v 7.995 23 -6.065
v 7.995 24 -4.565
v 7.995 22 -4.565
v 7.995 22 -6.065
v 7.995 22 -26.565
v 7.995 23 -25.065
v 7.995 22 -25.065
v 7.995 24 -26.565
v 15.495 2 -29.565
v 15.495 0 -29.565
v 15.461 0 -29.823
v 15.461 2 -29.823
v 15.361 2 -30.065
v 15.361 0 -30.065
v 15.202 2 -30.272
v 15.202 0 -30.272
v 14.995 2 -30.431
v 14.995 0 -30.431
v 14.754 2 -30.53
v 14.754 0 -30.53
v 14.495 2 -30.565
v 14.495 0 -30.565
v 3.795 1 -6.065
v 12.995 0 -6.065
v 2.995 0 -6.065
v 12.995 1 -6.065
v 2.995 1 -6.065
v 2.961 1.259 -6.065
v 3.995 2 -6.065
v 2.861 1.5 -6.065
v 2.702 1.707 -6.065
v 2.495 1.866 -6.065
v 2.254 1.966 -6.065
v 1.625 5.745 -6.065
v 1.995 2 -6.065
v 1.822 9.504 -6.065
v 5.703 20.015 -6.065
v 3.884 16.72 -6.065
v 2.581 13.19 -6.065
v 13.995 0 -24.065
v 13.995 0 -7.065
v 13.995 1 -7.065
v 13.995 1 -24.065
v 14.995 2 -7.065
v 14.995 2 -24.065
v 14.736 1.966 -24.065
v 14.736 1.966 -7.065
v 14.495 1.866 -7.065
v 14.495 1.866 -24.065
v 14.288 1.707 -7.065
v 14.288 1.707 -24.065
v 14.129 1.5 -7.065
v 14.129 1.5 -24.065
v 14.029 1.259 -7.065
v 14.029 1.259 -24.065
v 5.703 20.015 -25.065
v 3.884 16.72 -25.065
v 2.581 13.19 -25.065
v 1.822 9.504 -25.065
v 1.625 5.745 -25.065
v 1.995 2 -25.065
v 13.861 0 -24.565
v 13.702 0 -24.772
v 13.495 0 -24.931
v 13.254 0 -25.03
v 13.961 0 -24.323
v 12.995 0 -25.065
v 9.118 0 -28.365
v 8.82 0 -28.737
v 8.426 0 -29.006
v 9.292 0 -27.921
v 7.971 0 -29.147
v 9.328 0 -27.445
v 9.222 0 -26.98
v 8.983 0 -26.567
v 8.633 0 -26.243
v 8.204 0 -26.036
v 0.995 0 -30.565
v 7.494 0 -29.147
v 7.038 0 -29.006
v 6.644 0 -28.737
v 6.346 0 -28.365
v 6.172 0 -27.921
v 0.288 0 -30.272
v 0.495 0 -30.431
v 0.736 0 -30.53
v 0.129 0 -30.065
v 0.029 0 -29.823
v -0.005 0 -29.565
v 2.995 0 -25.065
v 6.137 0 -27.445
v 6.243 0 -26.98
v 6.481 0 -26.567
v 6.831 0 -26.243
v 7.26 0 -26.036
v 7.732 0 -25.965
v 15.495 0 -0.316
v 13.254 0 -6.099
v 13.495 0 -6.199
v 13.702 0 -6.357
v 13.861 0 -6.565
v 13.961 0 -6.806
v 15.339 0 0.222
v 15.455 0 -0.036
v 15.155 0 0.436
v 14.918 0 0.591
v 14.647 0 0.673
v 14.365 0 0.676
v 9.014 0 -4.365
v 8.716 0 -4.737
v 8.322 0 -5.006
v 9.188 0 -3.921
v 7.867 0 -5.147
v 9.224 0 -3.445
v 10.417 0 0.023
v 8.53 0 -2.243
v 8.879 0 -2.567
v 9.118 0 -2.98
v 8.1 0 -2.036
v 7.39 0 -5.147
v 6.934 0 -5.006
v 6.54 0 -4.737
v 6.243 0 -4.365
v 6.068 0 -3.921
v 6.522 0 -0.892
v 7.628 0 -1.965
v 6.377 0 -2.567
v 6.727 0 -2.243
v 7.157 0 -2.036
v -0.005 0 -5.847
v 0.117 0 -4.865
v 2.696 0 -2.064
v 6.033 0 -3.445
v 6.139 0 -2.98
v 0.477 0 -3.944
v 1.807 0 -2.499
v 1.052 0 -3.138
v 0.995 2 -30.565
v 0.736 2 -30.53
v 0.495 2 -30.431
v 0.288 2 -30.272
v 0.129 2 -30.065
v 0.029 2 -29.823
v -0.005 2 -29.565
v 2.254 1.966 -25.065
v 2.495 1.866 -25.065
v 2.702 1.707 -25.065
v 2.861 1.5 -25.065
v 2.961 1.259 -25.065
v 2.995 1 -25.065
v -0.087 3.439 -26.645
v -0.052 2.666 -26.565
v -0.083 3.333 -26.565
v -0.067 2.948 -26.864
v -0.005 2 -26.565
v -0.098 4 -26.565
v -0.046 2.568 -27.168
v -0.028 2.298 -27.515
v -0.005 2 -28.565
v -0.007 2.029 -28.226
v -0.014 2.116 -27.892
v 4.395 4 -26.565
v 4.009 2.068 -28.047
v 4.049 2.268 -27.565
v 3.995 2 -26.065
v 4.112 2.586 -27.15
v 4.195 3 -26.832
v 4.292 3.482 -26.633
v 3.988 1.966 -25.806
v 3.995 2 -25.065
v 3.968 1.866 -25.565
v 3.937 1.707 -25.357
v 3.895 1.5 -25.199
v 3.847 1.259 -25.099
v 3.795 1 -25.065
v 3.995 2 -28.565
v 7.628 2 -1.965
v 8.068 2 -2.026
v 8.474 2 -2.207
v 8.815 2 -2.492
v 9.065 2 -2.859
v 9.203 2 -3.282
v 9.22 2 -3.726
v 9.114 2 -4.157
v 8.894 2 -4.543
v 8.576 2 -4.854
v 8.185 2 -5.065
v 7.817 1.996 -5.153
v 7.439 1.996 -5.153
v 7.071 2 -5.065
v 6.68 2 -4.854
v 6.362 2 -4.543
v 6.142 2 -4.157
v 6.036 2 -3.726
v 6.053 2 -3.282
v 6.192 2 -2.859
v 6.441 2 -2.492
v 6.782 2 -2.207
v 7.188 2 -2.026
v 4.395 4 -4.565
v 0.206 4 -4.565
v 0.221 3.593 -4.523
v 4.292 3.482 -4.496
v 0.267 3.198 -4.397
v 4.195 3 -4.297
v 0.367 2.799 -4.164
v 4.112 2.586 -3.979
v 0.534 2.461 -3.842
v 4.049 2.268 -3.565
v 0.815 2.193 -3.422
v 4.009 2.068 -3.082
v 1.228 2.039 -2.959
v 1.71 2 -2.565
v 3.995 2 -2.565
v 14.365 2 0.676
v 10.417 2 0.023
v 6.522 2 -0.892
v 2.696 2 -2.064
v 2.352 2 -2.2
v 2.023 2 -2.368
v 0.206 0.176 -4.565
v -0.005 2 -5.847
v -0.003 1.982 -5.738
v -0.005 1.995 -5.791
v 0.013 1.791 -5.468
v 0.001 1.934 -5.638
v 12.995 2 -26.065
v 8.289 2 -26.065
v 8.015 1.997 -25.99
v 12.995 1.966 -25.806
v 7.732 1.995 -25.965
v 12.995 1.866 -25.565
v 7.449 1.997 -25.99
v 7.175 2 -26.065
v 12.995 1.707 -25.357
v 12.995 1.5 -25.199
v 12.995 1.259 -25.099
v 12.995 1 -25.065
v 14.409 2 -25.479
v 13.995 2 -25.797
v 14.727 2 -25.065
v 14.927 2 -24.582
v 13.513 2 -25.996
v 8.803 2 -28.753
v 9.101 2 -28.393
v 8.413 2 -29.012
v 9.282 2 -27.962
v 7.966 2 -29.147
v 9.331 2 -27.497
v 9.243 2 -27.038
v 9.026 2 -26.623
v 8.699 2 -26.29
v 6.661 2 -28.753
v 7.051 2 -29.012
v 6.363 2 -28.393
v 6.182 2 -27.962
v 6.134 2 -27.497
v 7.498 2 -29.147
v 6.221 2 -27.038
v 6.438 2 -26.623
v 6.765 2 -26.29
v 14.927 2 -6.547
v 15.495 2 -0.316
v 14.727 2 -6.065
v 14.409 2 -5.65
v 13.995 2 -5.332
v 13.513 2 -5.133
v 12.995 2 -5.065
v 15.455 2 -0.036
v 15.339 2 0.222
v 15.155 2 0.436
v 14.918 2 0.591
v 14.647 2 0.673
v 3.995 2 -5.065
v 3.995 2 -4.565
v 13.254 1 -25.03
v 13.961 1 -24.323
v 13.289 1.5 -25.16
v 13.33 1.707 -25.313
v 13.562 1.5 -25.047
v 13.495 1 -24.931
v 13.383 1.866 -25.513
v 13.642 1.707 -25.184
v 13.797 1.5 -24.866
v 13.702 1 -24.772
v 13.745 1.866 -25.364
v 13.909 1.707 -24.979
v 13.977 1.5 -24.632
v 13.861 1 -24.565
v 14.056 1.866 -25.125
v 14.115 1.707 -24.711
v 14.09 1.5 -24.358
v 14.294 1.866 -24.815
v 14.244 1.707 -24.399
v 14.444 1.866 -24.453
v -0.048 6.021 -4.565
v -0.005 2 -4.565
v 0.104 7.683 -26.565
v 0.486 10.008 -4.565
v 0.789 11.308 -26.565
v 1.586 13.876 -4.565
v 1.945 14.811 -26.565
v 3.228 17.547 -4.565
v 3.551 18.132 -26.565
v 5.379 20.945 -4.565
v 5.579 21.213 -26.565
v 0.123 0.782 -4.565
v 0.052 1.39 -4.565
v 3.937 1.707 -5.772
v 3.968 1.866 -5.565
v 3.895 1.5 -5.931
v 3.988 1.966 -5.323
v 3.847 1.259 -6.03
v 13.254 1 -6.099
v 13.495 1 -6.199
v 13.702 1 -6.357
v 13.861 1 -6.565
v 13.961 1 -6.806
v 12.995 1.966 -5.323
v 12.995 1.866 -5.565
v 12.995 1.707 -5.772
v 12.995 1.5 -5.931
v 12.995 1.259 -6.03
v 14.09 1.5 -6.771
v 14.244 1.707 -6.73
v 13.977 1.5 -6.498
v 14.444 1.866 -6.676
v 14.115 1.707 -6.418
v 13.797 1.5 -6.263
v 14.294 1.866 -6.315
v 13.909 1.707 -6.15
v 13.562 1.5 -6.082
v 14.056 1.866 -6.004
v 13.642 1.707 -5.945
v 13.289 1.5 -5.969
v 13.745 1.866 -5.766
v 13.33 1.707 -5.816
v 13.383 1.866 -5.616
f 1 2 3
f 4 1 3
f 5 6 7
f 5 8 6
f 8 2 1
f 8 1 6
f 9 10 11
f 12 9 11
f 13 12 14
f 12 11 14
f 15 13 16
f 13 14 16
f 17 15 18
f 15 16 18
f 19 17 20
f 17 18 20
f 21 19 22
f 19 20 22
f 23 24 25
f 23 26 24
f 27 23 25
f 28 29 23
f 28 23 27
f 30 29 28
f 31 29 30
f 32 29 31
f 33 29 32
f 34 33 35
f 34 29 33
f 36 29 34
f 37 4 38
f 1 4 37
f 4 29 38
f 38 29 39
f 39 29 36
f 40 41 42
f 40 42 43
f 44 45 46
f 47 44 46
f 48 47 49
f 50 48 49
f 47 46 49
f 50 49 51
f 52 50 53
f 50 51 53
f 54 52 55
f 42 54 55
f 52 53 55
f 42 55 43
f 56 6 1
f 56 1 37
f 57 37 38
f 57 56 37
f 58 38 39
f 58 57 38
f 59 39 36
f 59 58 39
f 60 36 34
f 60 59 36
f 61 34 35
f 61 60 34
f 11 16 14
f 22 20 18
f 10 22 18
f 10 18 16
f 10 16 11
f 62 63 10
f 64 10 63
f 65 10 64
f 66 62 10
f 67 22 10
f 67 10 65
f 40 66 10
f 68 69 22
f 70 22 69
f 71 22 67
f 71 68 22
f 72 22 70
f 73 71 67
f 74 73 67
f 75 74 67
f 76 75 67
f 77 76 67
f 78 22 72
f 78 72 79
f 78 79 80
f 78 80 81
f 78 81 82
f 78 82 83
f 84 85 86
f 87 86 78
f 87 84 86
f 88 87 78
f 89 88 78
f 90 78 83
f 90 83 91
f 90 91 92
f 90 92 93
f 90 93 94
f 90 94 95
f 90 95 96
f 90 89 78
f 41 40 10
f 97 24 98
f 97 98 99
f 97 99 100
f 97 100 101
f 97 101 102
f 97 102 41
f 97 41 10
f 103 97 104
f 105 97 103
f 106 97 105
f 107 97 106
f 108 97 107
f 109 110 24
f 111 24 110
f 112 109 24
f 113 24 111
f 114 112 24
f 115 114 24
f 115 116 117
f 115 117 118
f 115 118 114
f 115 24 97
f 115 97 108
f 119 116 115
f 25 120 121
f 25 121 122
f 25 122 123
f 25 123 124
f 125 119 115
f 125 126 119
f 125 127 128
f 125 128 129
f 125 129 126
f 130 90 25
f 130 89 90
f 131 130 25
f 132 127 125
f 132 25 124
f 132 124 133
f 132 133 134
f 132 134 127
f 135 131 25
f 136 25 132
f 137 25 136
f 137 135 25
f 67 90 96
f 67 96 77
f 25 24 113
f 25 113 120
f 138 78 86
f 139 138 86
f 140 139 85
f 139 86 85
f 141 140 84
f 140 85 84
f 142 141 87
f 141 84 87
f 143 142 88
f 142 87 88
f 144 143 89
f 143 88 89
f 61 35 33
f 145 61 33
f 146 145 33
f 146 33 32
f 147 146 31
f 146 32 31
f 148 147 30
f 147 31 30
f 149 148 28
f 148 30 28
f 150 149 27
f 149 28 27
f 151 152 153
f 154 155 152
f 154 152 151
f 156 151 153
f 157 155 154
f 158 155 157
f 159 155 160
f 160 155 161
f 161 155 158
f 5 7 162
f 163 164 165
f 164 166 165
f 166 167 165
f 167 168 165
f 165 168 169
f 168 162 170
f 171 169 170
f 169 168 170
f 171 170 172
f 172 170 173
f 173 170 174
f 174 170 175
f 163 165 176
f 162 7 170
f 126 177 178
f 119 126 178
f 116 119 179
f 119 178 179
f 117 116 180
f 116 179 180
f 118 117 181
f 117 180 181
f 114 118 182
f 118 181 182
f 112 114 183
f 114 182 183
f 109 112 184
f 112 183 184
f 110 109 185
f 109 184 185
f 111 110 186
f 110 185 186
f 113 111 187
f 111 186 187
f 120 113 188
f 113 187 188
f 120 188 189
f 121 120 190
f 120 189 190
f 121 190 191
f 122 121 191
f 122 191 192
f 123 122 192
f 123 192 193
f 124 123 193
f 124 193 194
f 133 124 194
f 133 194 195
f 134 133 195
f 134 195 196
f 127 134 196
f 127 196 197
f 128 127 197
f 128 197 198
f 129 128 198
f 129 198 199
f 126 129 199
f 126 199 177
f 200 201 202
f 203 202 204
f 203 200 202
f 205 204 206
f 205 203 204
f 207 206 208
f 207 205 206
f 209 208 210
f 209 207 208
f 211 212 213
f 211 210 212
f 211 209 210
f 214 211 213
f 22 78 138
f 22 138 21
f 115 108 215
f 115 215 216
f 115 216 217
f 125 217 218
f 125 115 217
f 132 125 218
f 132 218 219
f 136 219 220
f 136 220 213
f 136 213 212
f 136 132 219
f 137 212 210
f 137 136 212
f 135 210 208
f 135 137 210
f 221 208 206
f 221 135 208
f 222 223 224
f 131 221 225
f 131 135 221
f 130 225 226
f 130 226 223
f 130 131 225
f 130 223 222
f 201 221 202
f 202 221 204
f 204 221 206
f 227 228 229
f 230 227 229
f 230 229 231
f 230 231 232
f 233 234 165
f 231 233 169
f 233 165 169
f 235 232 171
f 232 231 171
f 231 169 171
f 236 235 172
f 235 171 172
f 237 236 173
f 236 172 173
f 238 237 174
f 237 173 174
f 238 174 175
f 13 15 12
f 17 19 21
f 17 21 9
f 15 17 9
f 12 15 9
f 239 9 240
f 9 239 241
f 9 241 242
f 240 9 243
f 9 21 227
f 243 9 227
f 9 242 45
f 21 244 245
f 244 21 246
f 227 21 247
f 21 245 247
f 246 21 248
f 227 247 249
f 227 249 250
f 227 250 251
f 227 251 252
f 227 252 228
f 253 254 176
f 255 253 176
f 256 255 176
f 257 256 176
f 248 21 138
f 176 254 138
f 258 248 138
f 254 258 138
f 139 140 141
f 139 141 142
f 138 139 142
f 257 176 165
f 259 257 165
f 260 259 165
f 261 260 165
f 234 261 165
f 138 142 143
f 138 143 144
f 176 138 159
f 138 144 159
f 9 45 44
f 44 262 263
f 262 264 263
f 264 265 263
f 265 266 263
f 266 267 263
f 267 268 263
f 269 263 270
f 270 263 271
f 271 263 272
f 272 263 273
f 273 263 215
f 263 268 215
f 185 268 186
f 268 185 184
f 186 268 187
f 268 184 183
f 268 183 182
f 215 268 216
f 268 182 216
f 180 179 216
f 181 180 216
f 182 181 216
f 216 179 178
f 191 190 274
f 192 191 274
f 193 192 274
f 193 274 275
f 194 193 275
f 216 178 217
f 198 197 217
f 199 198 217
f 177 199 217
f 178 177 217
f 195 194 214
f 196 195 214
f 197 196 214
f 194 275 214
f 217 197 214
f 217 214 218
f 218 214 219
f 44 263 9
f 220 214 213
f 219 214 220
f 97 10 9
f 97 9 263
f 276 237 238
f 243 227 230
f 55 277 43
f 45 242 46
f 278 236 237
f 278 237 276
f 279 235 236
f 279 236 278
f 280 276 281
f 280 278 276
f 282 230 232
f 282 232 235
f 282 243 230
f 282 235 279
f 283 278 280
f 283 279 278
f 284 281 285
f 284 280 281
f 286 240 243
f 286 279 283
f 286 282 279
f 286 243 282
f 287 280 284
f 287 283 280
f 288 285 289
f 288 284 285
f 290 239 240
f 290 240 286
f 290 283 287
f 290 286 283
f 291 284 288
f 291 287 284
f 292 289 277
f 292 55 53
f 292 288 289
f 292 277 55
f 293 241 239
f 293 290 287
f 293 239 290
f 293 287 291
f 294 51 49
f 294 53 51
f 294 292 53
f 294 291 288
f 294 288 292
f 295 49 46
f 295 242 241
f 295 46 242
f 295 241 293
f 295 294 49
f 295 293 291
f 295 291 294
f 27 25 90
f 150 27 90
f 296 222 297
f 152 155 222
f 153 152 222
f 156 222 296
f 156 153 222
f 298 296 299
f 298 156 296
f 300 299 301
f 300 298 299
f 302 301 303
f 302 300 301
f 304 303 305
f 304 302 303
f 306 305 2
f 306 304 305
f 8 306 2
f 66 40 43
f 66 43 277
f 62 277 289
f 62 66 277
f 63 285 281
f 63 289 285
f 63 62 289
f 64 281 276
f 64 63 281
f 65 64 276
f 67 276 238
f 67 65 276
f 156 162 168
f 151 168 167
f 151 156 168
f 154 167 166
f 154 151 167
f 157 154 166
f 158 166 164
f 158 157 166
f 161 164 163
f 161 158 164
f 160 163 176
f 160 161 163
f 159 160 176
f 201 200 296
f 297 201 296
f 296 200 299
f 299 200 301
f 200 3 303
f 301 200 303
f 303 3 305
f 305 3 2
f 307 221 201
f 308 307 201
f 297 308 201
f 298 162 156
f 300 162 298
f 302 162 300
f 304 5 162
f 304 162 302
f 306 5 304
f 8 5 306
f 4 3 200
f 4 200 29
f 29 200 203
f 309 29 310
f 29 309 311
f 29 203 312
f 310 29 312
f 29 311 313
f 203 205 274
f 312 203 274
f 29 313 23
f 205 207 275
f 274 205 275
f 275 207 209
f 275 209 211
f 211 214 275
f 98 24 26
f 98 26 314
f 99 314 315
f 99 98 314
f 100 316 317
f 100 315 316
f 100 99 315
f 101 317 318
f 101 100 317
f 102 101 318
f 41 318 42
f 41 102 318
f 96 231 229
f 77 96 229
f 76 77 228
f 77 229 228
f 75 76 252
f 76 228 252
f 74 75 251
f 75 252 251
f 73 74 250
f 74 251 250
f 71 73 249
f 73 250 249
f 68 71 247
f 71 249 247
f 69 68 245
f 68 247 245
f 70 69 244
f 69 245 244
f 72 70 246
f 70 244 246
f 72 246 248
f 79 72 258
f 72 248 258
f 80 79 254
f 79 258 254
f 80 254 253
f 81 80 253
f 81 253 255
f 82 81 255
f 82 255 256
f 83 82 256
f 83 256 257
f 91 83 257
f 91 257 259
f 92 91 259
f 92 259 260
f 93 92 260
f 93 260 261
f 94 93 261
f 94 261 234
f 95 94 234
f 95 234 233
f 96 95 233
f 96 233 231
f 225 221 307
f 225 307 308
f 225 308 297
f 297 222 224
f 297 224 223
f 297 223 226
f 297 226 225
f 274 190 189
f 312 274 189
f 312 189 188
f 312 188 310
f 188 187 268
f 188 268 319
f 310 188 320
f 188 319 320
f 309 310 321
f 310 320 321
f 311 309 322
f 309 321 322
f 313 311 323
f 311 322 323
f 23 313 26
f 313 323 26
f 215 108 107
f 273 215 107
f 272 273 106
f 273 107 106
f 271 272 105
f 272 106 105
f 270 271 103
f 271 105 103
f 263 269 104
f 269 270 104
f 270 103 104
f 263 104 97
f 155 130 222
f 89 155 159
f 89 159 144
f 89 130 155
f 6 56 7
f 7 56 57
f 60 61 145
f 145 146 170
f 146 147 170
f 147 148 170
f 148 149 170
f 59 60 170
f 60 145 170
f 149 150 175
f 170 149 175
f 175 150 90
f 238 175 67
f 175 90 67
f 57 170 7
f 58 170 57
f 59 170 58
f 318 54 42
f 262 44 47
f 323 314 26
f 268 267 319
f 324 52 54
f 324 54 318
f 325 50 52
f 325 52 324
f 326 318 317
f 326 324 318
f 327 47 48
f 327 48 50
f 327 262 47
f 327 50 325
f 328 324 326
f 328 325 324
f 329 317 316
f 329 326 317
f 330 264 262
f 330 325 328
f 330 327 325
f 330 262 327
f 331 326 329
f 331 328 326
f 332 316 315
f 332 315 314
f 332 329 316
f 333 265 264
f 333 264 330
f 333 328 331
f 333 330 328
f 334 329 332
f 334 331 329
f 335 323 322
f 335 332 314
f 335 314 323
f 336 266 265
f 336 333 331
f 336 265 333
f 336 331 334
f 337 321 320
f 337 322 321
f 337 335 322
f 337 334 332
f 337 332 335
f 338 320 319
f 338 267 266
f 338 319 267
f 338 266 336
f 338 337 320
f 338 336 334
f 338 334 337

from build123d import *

# Parameters (mm, degrees)
SKETCH1_W                = 11
SKETCH1_H                = 19
BOSS_EXTRUDE1_DEPTH      = 2
BOSS_EXTRUDE2_DEPTH      = 11
BOSS_EXTRUDE2_DEPTH_BACK = 11
BOSS_EXTRUDE3_DEPTH      = 1.5
BOSS_EXTRUDE4_START      = -22
BOSS_EXTRUDE4_DEPTH      = 1.5
SKETCH4_R                = 1.6
CUT_EXTRUDE1_DEPTH       = 41.722097522
FILLET1_R                = 4
FILLET2_R                = 1
FILLET3_R                = 2


with BuildPart() as part:
    # Sketch1 → Boss-Extrude1 (new body)
    with BuildSketch(Plane(origin=(0, 0, 0), x_dir=(1, 0, 0), z_dir=(0, 1, 0))):
        with BuildLine():
            Line((-0.004910497, 3.064545275), (-0.004910497, 30.564545275))
            Line((-0.004910497, 30.564545275), (15.495089503, 30.564545275))
            Line((15.495089503, 30.564545275), (15.495089503, -0.81352161))
            ThreePointArc((15.495089503, -0.81352161), (7.615422876, 0.607255499), (-0.004910497, 3.064545275))
        make_face()
        with Locations((8.495089503, 15.564545275)):
            Rectangle(SKETCH1_W, SKETCH1_H, mode=Mode.SUBTRACT)
    extrude(amount=BOSS_EXTRUDE1_DEPTH)

    # Sketch2 → Boss-Extrude2 (add, two sides: drawn at the far end of the back side and taken through both)
    with BuildSketch(Plane.XY.offset(-15.564545275).offset(-BOSS_EXTRUDE2_DEPTH_BACK)):
        with BuildLine():
            Line((7.995089503, 24), (7.995089503, 23))
            ThreePointArc((7.995089503, 23), (2.580593395, 13.189856031), (1.995089503, 2))
            Line((1.995089503, 2), (-0.004910497, 2))
            ThreePointArc((-0.004910497, 2), (1.585642128, 13.876162682), (7.995089503, 24))
        make_face()
    extrude(amount=BOSS_EXTRUDE2_DEPTH + BOSS_EXTRUDE2_DEPTH_BACK)

    # Sketch3 → Boss-Extrude3 (add)
    with BuildSketch(Plane.XY.offset(-4.564545275)):
        with BuildLine():
            Line((7.995089503, 24), (7.995089503, 22))
            Line((7.995089503, 22), (3.995089503, 2))
            Line((3.995089503, 2), (-0.004910497, 2))
            ThreePointArc((-0.004910497, 2), (1.760688004, 13.812509636), (7.995089503, 24))
        make_face()
    extrude(amount=-BOSS_EXTRUDE3_DEPTH)

    # Sketch3<2> → Boss-Extrude4 (add)
    with BuildSketch(Plane.XY.offset(-4.564545275).offset(BOSS_EXTRUDE4_START)):
        with BuildLine():
            Line((7.995089503, 24), (7.995089503, 22))
            Line((7.995089503, 22), (3.995089503, 2))
            Line((3.995089503, 2), (-0.004910497, 2))
            ThreePointArc((-0.004910497, 2), (1.760688004, 13.812509636), (7.995089503, 24))
        make_face()
    extrude(amount=BOSS_EXTRUDE4_DEPTH)

    # Sketch4 → Cut-Extrude1 (cut, through all)
    with BuildSketch(Plane(origin=(0, 2, 0), x_dir=(1, 0, 0), z_dir=(0, 1, 0))):
        with Locations(Location((7.732104354, 27.564545275, 0), (0, 0, 270))):
            Circle(SKETCH4_R)
        with Locations(Location((7.628223159, 3.564545275, 0), (0, 0, 270))):
            Circle(SKETCH4_R)
    extrude(amount=-CUT_EXTRUDE1_DEPTH, mode=Mode.SUBTRACT)

    # Fillet1
    # the kernel refuses this fillet: 4 mm, written as the material it takes off along each edge
    with BuildSketch(Plane(origin=(-0.004910497, -7.201261458, -3.064545275), x_dir=(0, 0, -1), z_dir=(0, 1, 0))) as fillet1_piece_1_section:
        with BuildLine():
            CenterArc((2.782831809, -4), FILLET1_R, 90, 71.052480457)
            ThreePointArc((-1.000433732, -2.701192145), (-0.516429194, -1.344591553), (0, 0))
            Line((0, 0), (2.782831809, 0))
        make_face()
    fillet1_piece_1 = extrude(amount=16.402522916, mode=Mode.PRIVATE)
    fillet1_piece_1 = fillet1_piece_1 - Plane(origin=(27.899857986, 4.307356915, -4.929207358), x_dir=(-0.9965988743768334, -0.08240560412271017, 0), z_dir=(0, 0, -1)) * Cylinder(28, 44, mode=Mode.PRIVATE)
    add(fillet1_piece_1, mode=Mode.SUBTRACT)
    with BuildSketch(Plane(origin=(-0.004910497, -7.201261458, -3.064545275), x_dir=(0, 0, -1), z_dir=(0, 1, 0))) as fillet1_piece_2_section:
        with BuildLine():
            CenterArc((2.782831809, -4), FILLET1_R, 90, 71.052480457)
            ThreePointArc((-1.000433732, -2.701192145), (-0.516429194, -1.344591553), (0, 0))
            Line((0, 0), (2.782831809, 0))
        make_face()
    fillet1_piece_2 = extrude(amount=16.402522916, mode=Mode.PRIVATE)
    fillet1_piece_2 = split(fillet1_piece_2, bisect_by=Plane(origin=(0.675993318, 1.051688324, -4.564545275), z_dir=(0, 0, 1)), keep=Keep.TOP, mode=Mode.PRIVATE)
    add(fillet1_piece_2, mode=Mode.SUBTRACT)

    # Fillet2
    # the kernel refuses this fillet: 1 mm, written as the material it adds along each edge
    with BuildSketch(Plane(origin=(13.995089503, 0, -6.064545275), x_dir=(0, 0, -1), z_dir=(0, 1, 0)), Plane(origin=(13.995089503, 0, -25.064545275), x_dir=(-1, 0, 0), z_dir=(0, 1, 0))) as fillet2_piece_1:
        with BuildLine():
            CenterArc((FILLET2_R, FILLET2_R), FILLET2_R, 180, 90)
            Line((0, FILLET2_R), (0, 0))
            Line((0, 0), (FILLET2_R, 0))
        make_face()
    extrude(amount=2)
    # the kernel refuses this fillet: 1 mm, written as the material it takes off along each edge
    with BuildSketch(Plane(origin=(2.995089503, 2, -6.064545275), x_dir=(0, -1, 0), z_dir=(0, 0, -1))) as fillet2_2_piece_1:
        with BuildLine():
            CenterArc((FILLET2_R, FILLET2_R), FILLET2_R, 180, 90)
            Line((0, FILLET2_R), (0, 0))
            Line((0, 0), (FILLET2_R, 0))
        make_face()
    extrude(amount=19, mode=Mode.SUBTRACT)
    with BuildSketch(Plane(origin=(-0.004910497, -2.5, -30.564545275), x_dir=(0, 0, 1), z_dir=(0, 1, 0)), Plane(origin=(15.495089503, -2.5, -30.564545275), x_dir=(-1, 0, 0), z_dir=(0, 1, 0))) as fillet2_2_piece_2:
        with BuildLine():
            CenterArc((FILLET2_R, FILLET2_R), FILLET2_R, 180, 90)
            Line((0, FILLET2_R), (0, 0))
            Line((0, 0), (FILLET2_R, 0))
        make_face()
    extrude(amount=7, mode=Mode.SUBTRACT)
    with BuildSketch(Plane(origin=(15.495089503, -2.846412971, 0.81352161), x_dir=(0, 0, -1), z_dir=(0, 1, 0))) as fillet2_2_piece_3:
        with BuildLine():
            CenterArc((1.129037279, 1), FILLET2_R, 172.517371348, 97.482628652)
            ThreePointArc((0.137552889, 1.130225593), (0.066095477, 0.565439081), (0, 0))
            Line((0, 0), (1.129037279, 0))
        make_face()
    extrude(amount=7.692825941, mode=Mode.SUBTRACT)
    # the kernel refuses this fillet: 1 mm, written as the material it takes off along each edge
    with BuildSketch(Plane(origin=(12.995089503, 2, -6.064545275), x_dir=(0, 0, 1), z_dir=(-1, 0, 0))) as fillet2_3_piece_1_section:
        with BuildLine():
            CenterArc((FILLET2_R, -FILLET2_R), FILLET2_R, 90, 90)
            Line((0, -FILLET2_R), (0, 0))
            Line((0, 0), (FILLET2_R, 0))
        make_face()
    fillet2_3_piece_1 = extrude(amount=11.5, mode=Mode.PRIVATE)
    fillet2_3_piece_1 = split(fillet2_3_piece_1, bisect_by=Plane(origin=(4.123556577, 2.642335372, -5.838757255), z_dir=(0.9805806756909202, -0.19611613513818374, 0)), keep=Keep.TOP, mode=Mode.PRIVATE)
    add(fillet2_3_piece_1, mode=Mode.SUBTRACT)
    with BuildSketch(Plane(origin=(1.495089503, 2, -25.064545275), x_dir=(0, 0, -1), z_dir=(1, 0, 0))) as fillet2_3_piece_2_section:
        with BuildLine():
            CenterArc((FILLET2_R, -FILLET2_R), FILLET2_R, 90, 90)
            Line((0, -FILLET2_R), (0, 0))
            Line((0, 0), (FILLET2_R, 0))
        make_face()
    fillet2_3_piece_2 = extrude(amount=11.5, mode=Mode.PRIVATE)
    fillet2_3_piece_2 = split(fillet2_3_piece_2, bisect_by=Plane(origin=(4.123556577, 2.642335372, -25.290333294), z_dir=(0.9805806756909202, -0.19611613513818374, 0)), keep=Keep.TOP, mode=Mode.PRIVATE)
    add(fillet2_3_piece_2, mode=Mode.SUBTRACT)
    with BuildSketch(Plane(origin=(13.995089503, 2, -24.064545275), x_dir=(1, 0, 0), z_dir=(0, 0, 1))) as fillet2_3_piece_3:
        with BuildLine():
            CenterArc((FILLET2_R, -FILLET2_R), FILLET2_R, 90, 90)
            Line((0, -FILLET2_R), (0, 0))
            Line((0, 0), (FILLET2_R, 0))
        make_face()
    extrude(amount=17, mode=Mode.SUBTRACT)
    with BuildSketch(Plane(origin=(12.995089503, 2, -24.064545275), x_dir=(0, 0, -1), z_dir=(-1, 0, 0))) as fillet2_3_piece_4:
        with BuildLine():
            CenterArc((1 + FILLET2_R, FILLET2_R), FILLET2_R, 180, 90)
            Line((1, FILLET2_R), (1, 0))
            Line((1, 0), (1 + FILLET2_R, 0))
        make_face()
    revolve(axis=Axis((12.995089503, 2, -24.064545275), (0, -1, 0)), revolution_arc=90, mode=Mode.SUBTRACT)
    with BuildSketch(Plane(origin=(12.995089503, 2, -7.064545275), x_dir=(1, 0, 0), z_dir=(0, 0, -1))) as fillet2_3_piece_5:
        with BuildLine():
            CenterArc((1 + FILLET2_R, FILLET2_R), FILLET2_R, 180, 90)
            Line((1, FILLET2_R), (1, 0))
            Line((1, 0), (1 + FILLET2_R, 0))
        make_face()
    revolve(axis=Axis((12.995089503, 2, -7.064545275), (0, -1, 0)), revolution_arc=90, mode=Mode.SUBTRACT)

    # Fillet3
    # the kernel refuses this fillet: 2 mm, written as the material it adds along each edge
    with BuildSketch(Plane(origin=(8.995089503, 2, -4.564545275), x_dir=(0, 0, 1), z_dir=(-1, 0, 0))) as fillet3_piece_1_section:
        with BuildLine():
            CenterArc((FILLET3_R, FILLET3_R), FILLET3_R, 180, 90)
            Line((0, FILLET3_R), (0, 0))
            Line((0, 0), (FILLET3_R, 0))
        make_face()
    fillet3_piece_1 = extrude(amount=13.788712519, mode=Mode.PRIVATE)
    fillet3_piece_1 = fillet3_piece_1 & Plane(origin=(3.995089503, 2.466350157, -5.847377084), x_dir=(0, 0, -1), z_dir=(0, -1, 0)) * Cylinder(4, 36, mode=Mode.PRIVATE)
    fillet3_piece_1 = split(fillet3_piece_1, bisect_by=Plane(origin=(4.017419709, 2.111651029, -4.143772398), z_dir=(-0.9805806756909202, 0.19611613513818374, 0)), keep=Keep.TOP, mode=Mode.PRIVATE)
    add(fillet3_piece_1)
    with BuildSketch(Plane(origin=(-5.004910497, 2, -26.564545275), x_dir=(0, 0, -1), z_dir=(1, 0, 0))) as fillet3_piece_2_section:
        with BuildLine():
            CenterArc((FILLET3_R, FILLET3_R), FILLET3_R, 180, 90)
            Line((0, FILLET3_R), (0, 0))
            Line((0, 0), (FILLET3_R, 0))
        make_face()
    fillet3_piece_2 = extrude(amount=14, mode=Mode.PRIVATE)
    fillet3_piece_2 = fillet3_piece_2 & Plane(origin=(27.899857986, 4.307356915, -26.843512553), x_dir=(-0.9965988743768334, -0.08240560412271017, 0), z_dir=(0, 0, -1)) * Cylinder(28, 36, mode=Mode.PRIVATE)
    fillet3_piece_2 = split(fillet3_piece_2, bisect_by=Plane(origin=(3.978687185, 1.91798841, -26.843512553), z_dir=(-0.9805806756909202, 0.19611613513818374, 0)), keep=Keep.TOP, mode=Mode.PRIVATE)
    add(fillet3_piece_2)


solid = part.part
